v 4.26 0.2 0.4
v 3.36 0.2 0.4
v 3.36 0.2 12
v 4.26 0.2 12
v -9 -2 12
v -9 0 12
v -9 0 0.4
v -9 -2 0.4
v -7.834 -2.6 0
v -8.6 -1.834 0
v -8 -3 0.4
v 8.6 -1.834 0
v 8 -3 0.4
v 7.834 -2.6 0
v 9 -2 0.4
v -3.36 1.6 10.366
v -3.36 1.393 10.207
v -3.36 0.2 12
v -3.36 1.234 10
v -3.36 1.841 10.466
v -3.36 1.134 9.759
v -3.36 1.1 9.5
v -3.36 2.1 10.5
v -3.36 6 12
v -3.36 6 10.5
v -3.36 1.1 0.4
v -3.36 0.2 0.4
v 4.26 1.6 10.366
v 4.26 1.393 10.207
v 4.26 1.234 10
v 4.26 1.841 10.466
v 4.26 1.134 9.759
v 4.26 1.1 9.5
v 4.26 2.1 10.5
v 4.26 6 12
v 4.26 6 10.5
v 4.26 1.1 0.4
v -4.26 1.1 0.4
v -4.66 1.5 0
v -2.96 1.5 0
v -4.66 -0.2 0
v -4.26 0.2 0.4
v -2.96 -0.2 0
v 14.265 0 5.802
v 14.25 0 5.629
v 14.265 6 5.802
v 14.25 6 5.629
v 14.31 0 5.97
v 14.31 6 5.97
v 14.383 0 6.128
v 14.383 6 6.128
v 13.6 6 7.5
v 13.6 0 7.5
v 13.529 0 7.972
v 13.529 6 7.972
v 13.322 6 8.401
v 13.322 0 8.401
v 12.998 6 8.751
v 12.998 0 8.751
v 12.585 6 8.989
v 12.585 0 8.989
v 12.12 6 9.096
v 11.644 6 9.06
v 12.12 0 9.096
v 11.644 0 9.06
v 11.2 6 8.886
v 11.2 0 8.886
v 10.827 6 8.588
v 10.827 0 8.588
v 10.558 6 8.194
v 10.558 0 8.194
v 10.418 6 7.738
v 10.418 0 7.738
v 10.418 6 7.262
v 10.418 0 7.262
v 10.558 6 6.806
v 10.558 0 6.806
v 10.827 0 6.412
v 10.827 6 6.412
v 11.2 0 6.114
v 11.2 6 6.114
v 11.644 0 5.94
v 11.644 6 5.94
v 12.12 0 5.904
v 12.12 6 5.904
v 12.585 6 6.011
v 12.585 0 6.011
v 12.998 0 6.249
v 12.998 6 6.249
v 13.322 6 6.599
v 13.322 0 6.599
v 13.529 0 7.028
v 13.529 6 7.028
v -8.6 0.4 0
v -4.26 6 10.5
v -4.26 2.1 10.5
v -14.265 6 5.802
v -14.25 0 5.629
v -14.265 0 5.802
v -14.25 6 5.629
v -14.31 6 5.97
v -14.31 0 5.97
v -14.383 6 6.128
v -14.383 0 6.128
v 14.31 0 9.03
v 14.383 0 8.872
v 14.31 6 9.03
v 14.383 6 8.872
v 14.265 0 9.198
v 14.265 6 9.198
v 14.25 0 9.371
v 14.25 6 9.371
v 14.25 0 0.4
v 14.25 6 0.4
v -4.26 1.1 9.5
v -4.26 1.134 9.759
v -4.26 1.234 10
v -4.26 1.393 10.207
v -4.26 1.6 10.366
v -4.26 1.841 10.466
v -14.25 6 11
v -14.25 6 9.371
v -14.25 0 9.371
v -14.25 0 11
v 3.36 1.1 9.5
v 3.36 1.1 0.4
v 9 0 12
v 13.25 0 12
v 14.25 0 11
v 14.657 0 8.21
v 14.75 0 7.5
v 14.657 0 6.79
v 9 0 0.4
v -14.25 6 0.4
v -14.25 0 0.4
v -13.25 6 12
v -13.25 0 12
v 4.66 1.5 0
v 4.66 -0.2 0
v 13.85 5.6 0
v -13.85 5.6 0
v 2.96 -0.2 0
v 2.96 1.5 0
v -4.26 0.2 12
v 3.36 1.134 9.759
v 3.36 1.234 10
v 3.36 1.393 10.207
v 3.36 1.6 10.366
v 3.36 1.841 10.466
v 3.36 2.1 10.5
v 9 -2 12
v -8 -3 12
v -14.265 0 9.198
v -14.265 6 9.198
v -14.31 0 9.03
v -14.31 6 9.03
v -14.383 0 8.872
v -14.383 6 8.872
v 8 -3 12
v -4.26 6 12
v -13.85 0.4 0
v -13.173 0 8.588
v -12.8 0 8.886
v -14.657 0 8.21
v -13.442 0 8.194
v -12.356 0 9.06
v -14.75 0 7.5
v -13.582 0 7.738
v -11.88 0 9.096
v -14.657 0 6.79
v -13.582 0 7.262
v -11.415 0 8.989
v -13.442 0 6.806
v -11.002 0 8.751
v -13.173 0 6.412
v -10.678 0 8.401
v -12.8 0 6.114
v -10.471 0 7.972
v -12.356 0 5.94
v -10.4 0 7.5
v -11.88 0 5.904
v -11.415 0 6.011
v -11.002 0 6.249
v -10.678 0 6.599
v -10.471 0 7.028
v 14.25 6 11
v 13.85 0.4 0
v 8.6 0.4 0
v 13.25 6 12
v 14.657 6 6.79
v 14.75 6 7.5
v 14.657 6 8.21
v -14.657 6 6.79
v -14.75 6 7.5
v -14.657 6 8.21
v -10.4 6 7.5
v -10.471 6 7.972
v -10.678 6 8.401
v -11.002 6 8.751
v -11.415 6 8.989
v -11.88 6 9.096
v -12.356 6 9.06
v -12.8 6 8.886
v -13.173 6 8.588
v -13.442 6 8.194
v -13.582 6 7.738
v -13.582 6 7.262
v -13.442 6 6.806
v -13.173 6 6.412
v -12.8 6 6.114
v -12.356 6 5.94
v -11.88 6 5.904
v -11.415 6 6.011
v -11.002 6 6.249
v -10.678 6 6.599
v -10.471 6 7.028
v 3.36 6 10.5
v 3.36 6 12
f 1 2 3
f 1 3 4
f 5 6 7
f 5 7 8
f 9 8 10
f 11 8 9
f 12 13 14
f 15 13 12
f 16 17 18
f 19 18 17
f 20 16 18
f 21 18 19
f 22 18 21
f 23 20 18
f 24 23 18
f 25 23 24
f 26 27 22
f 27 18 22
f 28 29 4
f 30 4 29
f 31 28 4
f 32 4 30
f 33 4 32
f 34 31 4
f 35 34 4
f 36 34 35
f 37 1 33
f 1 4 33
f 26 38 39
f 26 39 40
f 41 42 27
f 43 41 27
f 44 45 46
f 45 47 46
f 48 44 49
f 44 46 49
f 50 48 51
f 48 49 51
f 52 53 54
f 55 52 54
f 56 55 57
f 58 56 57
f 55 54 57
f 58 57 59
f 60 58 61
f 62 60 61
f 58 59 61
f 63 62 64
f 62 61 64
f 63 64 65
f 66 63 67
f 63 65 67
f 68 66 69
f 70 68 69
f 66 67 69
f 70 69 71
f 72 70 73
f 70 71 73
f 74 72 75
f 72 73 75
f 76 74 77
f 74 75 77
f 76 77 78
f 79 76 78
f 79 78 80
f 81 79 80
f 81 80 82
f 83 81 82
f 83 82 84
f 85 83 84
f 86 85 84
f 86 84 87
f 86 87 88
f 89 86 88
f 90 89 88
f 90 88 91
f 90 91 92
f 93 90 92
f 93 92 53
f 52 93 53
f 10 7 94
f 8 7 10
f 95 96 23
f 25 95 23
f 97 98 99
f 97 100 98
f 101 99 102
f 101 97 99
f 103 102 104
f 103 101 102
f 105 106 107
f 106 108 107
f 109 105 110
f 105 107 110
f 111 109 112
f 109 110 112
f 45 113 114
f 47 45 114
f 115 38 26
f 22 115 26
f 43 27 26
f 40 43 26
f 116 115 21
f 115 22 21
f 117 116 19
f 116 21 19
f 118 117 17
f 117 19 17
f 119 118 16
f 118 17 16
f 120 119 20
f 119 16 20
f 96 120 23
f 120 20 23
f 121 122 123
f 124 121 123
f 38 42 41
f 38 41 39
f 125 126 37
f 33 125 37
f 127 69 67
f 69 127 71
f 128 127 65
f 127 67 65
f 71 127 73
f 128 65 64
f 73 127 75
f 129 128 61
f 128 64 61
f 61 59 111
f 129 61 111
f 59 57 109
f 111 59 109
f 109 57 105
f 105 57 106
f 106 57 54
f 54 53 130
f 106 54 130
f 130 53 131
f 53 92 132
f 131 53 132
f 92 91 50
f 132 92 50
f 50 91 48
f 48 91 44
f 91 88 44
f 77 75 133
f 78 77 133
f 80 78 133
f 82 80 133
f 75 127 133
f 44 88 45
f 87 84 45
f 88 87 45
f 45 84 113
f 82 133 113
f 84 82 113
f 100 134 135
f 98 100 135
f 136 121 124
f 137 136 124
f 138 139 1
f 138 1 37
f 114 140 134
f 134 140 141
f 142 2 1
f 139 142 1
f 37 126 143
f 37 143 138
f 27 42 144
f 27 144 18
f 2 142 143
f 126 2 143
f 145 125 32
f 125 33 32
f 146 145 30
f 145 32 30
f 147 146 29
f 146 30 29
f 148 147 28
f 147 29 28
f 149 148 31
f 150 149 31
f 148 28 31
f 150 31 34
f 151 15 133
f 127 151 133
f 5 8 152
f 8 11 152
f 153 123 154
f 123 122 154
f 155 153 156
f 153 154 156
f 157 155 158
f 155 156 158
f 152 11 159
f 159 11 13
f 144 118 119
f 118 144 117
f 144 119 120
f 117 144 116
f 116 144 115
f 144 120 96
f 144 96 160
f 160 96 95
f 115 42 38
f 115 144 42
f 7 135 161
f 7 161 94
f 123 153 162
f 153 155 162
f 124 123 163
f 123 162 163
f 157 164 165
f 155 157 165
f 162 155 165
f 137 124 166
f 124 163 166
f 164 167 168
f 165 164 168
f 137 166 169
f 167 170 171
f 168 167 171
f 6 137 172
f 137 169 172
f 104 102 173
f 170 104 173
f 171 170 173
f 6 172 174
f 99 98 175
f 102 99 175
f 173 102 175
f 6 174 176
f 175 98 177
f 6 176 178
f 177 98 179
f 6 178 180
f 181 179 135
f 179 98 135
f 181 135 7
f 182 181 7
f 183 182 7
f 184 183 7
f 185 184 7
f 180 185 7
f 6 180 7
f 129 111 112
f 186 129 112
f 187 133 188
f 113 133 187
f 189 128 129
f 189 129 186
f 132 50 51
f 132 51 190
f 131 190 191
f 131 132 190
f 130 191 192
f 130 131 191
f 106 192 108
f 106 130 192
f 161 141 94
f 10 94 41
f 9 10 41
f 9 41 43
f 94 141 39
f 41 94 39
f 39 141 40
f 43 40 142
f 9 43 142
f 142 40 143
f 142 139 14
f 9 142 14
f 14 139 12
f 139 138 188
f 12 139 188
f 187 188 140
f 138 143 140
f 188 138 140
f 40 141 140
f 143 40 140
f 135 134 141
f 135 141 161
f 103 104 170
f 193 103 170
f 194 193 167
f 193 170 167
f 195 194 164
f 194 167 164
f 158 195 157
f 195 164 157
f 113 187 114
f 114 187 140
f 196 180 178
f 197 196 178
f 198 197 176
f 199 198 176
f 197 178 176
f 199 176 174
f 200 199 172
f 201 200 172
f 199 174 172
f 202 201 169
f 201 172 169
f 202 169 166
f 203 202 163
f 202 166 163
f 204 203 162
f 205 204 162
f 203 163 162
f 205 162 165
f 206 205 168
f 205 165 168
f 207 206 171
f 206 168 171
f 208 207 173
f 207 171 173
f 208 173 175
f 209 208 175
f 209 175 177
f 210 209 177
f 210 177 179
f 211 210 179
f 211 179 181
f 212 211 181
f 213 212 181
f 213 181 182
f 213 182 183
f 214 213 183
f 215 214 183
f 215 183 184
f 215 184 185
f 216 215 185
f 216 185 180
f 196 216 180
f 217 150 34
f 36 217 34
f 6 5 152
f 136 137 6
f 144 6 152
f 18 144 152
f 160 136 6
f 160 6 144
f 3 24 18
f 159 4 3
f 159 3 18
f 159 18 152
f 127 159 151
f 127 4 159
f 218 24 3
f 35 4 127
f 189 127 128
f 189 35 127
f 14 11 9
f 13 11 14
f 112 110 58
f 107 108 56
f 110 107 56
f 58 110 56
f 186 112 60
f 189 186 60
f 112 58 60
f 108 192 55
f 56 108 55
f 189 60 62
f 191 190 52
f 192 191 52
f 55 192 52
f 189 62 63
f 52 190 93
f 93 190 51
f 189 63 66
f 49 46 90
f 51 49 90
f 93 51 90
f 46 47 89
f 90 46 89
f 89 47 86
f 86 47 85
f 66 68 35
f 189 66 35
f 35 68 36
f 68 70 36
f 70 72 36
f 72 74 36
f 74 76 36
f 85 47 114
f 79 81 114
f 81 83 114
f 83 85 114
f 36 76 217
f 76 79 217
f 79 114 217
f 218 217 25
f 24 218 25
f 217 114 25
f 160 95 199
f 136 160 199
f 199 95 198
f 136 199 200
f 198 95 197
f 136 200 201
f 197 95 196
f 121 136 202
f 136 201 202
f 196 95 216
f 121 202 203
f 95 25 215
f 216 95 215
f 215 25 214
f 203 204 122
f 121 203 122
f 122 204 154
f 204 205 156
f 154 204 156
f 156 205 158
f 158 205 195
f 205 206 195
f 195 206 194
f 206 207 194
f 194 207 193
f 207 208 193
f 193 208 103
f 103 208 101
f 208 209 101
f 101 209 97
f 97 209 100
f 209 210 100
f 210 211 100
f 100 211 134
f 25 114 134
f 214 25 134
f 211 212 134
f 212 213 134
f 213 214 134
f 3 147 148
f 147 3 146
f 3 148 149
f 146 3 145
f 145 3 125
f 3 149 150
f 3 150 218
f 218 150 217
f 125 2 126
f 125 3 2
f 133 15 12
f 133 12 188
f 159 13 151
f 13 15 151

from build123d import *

# Parameters (mm, degrees)
PAD_DEPTH       = 12
SKETCH001_R     = 1.6
POCKET_DEPTH    = 6.001
SKETCH002_W     = 0.9
SKETCH002_H     = 0.9
POCKET001_DEPTH = 12.001
SKETCH003_W     = 0.9
SKETCH003_H     = 1.5
POCKET002_DEPTH = 4.901
FILLET_R        = 1
PAD001_DEPTH    = 6
FILLET001_R     = 1
CHAMFER_SIZE    = 1
CHAMFER001_SIZE = 0.4


with BuildPart() as part:
    # Sketch → Pad (new body)
    with BuildSketch(Plane.XY):
        Polygon((-14.25, 0), (-9, 0), (-9, -3), (9, -3), (9, 0), (14.25, 0), (14.25, 6), (-14.25, 6), align=None)
    extrude(amount=PAD_DEPTH)

    # Sketch001 → Pocket (cut, through all)
    with BuildSketch(Plane.XZ):
        with Locations((-12, 7.5)):
            Circle(SKETCH001_R)
        with Locations((12, 7.5)):
            Circle(SKETCH001_R)
    extrude(amount=-POCKET_DEPTH, mode=Mode.SUBTRACT)

    # Sketch002 → Pocket001 (cut, through all)
    with BuildSketch(Plane.XY):
        with Locations((-3.81, 0.65)):
            Rectangle(SKETCH002_W, SKETCH002_H)
        with Locations((3.81, 0.65)):
            Rectangle(SKETCH002_W, SKETCH002_H)
    extrude(amount=POCKET001_DEPTH, mode=Mode.SUBTRACT)

    # Sketch003 (on Face15 of Pocket001) → Pocket002 (cut, through all)
    with BuildSketch(Plane.XZ.offset(-1.1)):
        with Locations((3.81, 11.25)):
            Rectangle(SKETCH003_W, SKETCH003_H)
        with Locations((-3.81, 11.25)):
            Rectangle(SKETCH003_W, SKETCH003_H)
    extrude(amount=-POCKET002_DEPTH, mode=Mode.SUBTRACT)

    # Fillet
    fillet_edges = [part.edges().sort_by_distance(p)[0] for p in [
        (3.81, 1.1, 10.5),
        (-3.81, 1.1, 10.5),
    ]]
    fillet(fillet_edges, radius=FILLET_R)

    # Sketch004 → Pad001 (join)
    with BuildSketch(Plane.XZ):
        with BuildLine():
            ThreePointArc((14.25, 5.918861), (14.75, 7.5), (14.25, 9.081139))
            Line((14.25, 9.081139), (14.25, 5.918861))
        make_face()
    pad001 = extrude(amount=-PAD001_DEPTH)

    # Mirrored: Pad001 across Sketch004 V_Axis
    add(pad001.mirror(Plane(origin=(0, 0, 0), x_dir=(0, -1, 0), z_dir=(1, 0, 0))))

    # Fillet001
    fillet001_edges = [part.edges().sort_by_distance(p)[0] for p in [
        (14.25, 3, 9.081139),
        (14.25, 3, 5.918861),
        (-14.25, 3, 9.081139),
        (-14.25, 3, 5.918861),
    ]]
    fillet(fillet001_edges, radius=FILLET001_R)

    # Chamfer
    chamfer_edges = [part.edges().sort_by_distance(p)[0] for p in [
        (14.25, 3, 12),
        (-14.25, 3, 12),
        (9, -3, 6),
        (-9, -3, 6),
    ]]
    chamfer(chamfer_edges, length=CHAMFER_SIZE)

    # Chamfer001
    chamfer001_edges = [part.edges().sort_by_distance(p)[0] for p in [
        (-9, -1, 0),
        (-8.5, -2.5, 0),
        (-11.625, 0, 0),
        (0, -3, 0),
        (-14.25, 3, 0),
        (8.5, -2.5, 0),
        (0, 6, 0),
        (9, -1, 0),
        (14.25, 3, 0),
        (11.625, 0, 0),
        (3.36, 0.65, 0),
        (3.81, 0.2, 0),
        (4.26, 0.65, 0),
        (3.81, 1.1, 0),
        (-4.26, 0.65, 0),
        (-3.81, 0.2, 0),
        (-3.36, 0.65, 0),
        (-3.81, 1.1, 0),
    ]]
    chamfer(chamfer001_edges, length=CHAMFER001_SIZE)


solid = part.part
